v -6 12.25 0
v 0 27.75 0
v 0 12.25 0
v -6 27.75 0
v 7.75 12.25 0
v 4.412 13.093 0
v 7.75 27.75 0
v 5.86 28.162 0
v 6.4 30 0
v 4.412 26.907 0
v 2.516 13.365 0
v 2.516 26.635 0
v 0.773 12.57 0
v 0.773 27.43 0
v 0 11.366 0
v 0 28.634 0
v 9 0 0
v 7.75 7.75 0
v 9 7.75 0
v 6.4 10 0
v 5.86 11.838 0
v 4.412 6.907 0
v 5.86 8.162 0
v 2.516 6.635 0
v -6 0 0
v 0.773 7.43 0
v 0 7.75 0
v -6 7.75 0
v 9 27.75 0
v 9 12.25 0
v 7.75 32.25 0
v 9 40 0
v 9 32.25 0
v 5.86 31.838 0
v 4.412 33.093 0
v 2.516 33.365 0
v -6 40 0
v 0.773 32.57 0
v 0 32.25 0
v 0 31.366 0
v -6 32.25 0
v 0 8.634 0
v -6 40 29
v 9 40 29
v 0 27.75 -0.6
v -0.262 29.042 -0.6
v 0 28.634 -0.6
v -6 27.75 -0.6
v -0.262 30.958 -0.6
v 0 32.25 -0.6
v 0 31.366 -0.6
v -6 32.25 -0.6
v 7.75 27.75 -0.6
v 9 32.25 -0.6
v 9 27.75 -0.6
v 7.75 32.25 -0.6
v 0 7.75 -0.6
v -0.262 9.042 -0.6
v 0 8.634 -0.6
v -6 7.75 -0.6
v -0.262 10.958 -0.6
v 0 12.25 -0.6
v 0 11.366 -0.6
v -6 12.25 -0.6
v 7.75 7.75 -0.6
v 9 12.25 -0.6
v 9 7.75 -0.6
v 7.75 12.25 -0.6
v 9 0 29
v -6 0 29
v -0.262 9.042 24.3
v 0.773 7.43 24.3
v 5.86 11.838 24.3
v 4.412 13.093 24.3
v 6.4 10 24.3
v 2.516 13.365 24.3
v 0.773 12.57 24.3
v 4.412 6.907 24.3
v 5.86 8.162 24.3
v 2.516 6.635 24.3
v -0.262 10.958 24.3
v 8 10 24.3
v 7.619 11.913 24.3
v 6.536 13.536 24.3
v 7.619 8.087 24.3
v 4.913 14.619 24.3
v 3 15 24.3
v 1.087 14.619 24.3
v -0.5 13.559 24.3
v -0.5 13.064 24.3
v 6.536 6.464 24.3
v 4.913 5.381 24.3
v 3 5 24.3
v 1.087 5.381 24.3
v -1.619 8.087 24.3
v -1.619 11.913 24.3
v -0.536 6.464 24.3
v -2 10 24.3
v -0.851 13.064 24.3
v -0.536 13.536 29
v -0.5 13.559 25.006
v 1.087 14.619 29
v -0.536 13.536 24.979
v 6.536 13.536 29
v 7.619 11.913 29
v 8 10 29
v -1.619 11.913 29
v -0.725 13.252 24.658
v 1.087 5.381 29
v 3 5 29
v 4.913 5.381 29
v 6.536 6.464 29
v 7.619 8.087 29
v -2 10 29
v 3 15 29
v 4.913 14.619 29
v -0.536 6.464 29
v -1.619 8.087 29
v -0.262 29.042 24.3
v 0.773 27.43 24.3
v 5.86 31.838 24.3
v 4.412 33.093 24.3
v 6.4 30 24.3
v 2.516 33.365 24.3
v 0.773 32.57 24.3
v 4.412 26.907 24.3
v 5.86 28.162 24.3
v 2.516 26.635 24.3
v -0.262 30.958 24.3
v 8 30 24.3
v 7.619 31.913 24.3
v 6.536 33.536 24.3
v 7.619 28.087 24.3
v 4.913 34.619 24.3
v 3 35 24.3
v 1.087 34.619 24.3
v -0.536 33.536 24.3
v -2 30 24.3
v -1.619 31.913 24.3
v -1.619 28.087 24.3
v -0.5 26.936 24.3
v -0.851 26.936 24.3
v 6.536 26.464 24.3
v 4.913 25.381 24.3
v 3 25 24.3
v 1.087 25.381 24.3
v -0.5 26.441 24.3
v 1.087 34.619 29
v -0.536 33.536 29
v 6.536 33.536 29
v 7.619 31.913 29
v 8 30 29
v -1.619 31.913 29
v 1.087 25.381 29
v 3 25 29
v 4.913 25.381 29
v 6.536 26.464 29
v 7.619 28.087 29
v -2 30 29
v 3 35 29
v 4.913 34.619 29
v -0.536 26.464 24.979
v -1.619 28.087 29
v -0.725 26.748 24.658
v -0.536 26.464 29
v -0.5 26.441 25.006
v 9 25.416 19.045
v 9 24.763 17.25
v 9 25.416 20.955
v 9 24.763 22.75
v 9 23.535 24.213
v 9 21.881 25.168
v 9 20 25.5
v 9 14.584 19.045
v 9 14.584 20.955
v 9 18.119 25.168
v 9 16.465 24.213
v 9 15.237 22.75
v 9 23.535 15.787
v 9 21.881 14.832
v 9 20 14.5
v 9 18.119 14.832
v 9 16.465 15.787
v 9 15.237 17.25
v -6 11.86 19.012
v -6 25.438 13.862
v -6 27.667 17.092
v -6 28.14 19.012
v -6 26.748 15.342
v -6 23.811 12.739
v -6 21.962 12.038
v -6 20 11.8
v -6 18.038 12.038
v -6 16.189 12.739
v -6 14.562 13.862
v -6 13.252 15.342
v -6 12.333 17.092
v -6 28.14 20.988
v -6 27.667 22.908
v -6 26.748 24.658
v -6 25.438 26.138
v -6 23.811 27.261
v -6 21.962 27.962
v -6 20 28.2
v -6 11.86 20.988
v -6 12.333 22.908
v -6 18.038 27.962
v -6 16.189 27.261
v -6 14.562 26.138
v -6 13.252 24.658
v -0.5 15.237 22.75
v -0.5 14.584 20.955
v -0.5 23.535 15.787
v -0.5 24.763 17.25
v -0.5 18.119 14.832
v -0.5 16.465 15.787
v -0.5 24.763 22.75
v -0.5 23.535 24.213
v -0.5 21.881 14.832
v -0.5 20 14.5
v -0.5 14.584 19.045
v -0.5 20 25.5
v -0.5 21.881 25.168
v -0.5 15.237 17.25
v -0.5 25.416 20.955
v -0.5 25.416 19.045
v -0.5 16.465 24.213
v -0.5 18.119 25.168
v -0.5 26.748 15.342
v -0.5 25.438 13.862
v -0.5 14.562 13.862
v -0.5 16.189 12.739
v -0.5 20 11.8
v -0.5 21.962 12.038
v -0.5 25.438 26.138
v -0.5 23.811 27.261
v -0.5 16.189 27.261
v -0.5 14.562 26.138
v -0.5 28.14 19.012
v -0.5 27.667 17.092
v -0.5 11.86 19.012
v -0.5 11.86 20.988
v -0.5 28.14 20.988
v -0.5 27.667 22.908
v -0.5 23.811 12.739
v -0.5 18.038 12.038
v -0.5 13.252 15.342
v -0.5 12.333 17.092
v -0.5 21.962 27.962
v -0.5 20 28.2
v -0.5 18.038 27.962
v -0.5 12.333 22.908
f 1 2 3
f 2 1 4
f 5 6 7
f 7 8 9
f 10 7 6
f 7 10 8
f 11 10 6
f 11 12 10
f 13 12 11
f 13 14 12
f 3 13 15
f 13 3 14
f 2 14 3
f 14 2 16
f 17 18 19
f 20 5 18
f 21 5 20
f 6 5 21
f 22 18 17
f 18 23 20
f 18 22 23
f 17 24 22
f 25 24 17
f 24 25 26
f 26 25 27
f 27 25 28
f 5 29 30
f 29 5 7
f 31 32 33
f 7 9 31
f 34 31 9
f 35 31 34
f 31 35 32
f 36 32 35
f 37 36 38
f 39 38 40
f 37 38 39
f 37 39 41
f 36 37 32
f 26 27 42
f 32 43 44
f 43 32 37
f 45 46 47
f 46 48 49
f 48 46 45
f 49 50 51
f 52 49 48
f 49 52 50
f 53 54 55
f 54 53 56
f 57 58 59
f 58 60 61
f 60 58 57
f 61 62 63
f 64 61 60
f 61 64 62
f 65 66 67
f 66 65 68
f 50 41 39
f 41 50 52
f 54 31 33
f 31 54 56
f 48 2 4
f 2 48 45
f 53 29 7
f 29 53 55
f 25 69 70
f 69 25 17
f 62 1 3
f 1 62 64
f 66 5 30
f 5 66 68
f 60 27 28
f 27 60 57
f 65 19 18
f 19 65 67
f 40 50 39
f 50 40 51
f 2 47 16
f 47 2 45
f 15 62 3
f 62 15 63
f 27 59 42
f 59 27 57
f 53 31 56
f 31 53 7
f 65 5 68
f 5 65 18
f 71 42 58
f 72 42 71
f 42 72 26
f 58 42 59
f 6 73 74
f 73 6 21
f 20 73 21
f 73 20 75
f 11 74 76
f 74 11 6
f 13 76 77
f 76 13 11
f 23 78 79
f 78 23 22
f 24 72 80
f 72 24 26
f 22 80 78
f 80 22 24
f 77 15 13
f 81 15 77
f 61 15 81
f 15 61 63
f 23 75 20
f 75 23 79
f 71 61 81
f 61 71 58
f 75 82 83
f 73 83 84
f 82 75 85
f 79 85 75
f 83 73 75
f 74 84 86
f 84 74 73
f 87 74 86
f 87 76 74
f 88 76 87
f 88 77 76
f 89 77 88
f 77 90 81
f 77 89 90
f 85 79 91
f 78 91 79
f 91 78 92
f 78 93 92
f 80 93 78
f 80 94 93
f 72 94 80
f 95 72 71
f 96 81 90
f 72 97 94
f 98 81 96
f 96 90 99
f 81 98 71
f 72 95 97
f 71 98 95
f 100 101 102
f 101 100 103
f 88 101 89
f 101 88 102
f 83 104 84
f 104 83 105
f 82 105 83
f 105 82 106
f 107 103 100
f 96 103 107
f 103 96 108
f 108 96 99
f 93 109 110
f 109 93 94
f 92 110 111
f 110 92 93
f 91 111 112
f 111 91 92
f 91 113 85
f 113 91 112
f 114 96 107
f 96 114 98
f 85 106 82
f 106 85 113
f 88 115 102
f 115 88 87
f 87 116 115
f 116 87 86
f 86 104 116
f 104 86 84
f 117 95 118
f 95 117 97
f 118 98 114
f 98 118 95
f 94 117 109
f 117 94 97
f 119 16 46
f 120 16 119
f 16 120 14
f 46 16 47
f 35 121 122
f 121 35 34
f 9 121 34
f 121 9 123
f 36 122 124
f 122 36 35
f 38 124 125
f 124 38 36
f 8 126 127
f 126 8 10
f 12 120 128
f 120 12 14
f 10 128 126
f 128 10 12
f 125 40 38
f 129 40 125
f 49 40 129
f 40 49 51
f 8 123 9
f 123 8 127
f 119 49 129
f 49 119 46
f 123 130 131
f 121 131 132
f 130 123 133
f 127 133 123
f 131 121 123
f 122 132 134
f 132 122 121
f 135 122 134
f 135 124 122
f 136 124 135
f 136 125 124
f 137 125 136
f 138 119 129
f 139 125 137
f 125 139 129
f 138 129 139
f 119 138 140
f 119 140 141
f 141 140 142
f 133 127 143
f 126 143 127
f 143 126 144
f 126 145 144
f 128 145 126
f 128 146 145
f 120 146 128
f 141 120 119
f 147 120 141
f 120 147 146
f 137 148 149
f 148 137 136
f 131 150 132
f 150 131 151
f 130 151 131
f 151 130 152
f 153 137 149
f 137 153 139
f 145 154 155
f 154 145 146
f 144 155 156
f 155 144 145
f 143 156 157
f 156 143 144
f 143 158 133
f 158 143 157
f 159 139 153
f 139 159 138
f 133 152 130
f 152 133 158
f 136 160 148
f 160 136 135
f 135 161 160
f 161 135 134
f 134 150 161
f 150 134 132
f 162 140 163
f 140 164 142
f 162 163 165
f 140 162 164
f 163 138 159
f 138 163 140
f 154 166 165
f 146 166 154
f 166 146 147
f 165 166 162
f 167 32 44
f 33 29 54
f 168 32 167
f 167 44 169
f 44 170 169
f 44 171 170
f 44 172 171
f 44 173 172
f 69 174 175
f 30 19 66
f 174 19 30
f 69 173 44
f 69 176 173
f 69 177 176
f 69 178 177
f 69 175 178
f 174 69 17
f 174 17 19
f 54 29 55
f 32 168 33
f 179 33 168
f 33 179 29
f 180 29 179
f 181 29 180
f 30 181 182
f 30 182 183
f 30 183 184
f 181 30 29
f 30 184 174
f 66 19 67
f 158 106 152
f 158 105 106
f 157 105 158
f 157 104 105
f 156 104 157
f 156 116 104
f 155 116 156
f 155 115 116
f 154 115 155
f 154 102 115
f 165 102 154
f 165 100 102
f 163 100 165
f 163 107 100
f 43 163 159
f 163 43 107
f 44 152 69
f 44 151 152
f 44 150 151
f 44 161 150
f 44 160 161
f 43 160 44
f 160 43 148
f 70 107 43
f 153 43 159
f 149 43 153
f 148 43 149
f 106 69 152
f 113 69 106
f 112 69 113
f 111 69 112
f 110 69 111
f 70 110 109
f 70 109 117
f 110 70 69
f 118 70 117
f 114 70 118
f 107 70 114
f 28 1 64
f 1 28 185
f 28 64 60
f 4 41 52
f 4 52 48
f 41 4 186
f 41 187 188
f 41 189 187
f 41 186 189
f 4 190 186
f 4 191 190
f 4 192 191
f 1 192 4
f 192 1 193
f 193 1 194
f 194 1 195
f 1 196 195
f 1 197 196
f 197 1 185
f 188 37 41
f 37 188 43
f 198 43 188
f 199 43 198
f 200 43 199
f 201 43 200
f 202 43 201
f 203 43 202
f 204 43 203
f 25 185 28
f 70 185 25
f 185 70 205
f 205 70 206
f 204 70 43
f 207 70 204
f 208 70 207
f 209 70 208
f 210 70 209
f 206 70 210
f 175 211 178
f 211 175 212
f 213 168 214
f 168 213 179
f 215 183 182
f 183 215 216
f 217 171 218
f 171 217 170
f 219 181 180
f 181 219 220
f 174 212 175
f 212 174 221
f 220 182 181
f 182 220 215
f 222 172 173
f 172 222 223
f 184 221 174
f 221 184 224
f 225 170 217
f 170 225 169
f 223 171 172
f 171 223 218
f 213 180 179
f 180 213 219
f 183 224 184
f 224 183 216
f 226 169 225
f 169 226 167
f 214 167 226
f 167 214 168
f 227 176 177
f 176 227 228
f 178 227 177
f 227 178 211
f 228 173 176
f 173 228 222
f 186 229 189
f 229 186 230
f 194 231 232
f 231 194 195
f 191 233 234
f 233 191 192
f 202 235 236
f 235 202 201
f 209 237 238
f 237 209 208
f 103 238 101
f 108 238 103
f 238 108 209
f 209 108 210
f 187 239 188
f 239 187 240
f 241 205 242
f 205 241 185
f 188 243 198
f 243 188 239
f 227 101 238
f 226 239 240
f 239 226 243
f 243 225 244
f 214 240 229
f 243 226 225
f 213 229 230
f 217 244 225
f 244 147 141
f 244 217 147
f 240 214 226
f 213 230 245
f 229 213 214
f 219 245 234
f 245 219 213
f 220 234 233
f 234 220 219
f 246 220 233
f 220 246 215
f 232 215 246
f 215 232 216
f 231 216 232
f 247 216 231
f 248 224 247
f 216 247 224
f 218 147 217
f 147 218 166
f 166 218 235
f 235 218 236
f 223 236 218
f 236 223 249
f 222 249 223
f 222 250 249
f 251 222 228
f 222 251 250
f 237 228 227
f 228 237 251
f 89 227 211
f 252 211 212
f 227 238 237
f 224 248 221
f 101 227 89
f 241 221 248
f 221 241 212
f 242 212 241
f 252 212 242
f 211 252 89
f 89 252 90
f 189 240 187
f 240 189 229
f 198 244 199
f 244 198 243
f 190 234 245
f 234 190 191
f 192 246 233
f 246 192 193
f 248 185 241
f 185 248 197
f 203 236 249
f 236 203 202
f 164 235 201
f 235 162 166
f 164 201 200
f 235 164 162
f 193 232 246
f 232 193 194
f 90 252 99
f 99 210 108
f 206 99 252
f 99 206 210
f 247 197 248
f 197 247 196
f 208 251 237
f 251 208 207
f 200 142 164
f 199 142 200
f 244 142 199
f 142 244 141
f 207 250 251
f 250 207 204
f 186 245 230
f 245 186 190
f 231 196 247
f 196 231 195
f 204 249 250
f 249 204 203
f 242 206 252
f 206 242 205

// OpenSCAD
wallThickness = 6;

nema17Width=42.30;
slotWidth=4.5;
slotHeight=0.6;

difference(){
	#translate([-wallThickness,0,-1])cube([15,40,30]);
	#translate([-20,20,20])rotate([0,90,0])cylinder(h=100,r=5.5);//nema17Big();
	#translate([-6.5,20,20])rotate([0,90,0])cylinder(h=6,r=8.2);//nema17Big();
	#translate([-100,0,-40])profile5_40x40(200);
	#rotate([0,0,90])translate([-100,-40,-40])profile5_40x40(200);
	translate([3,10,-slotHeight-0.1])m5Screw(25,40);
	translate([3,30,-slotHeight-0.1])m5Screw(25,40);
//	translate([30,10,-slotHeight-0.1])m3Screw(2.8,40);
//	translate([30,30,-slotHeight-0.1])m3Screw(2.8,40);
//	translate([55,50,56])rotate([90,0,0])cylinder(h=60,r=50);
}

//module nema17Big(){
//	union(){
//		cube([60,nema17Width,nema17Width]);
//		translate([0,nema17Width/2,nema17Width/2])rotate([0,-90,0])cylinder(h=22,r=6/2);
//		translate([0.1,nema17Width/2,nema17Width/2])rotate([0,-90,0])cylinder(h=0.2+wallThickness,r=22.5/2);
//		translate([0.1,5.5,5.5])rotate([0,-90,0])m3Screw(5.5,40);
//		translate([0.1,nema17Width-5.5,5.5])rotate([0,-90,0])m3Screw(5.5,40);
//		translate([0.1,5.5,nema17Width-5.5])rotate([0,-90,0])m3Screw(5.5,40);
//		translate([0.1,nema17Width-5.5,nema17Width-5.5])rotate([0,-90,0])m3Screw(5.5,40);
//	}
//}

//module m3Screw(h=10,headH=3) {
//	union() {
//		cylinder(h=h,r=1.7);
//		translate([0,0,h])cylinder(h=headH,r=5.65/2);
//	}
//}

module m5Screw(h=10,headH=3) {
	union() {
		cylinder(h=h,r=3.4);
		translate([0,0,h])cylinder(h=headH,r=5);
	}
}

module profile5_20x20(l=100) {
	difference(){
		cube([l,20,20]);
		translate([0,(20/2)-slotWidth/2,0])cube([l,slotWidth,slotHeight]);
		translate([0,(20/2)-slotWidth/2,20-slotHeight])cube([l,slotWidth,slotHeight]);
		translate([0,0,(20/2)-(slotWidth/2)])cube([l,slotHeight,slotWidth]);
		translate([0,20-slotHeight,(20/2)-(slotWidth/2)])cube([l,slotHeight,slotWidth]);
		
	}
	
}

module profile5_40x40(l=100) {
	union(){
		profile5_20x20(l);
		translate([0,20,0])profile5_20x20(l);
		translate([0,20,20])profile5_20x20(l);
		translate([0,0,20])profile5_20x20(l);
	}
	
}
